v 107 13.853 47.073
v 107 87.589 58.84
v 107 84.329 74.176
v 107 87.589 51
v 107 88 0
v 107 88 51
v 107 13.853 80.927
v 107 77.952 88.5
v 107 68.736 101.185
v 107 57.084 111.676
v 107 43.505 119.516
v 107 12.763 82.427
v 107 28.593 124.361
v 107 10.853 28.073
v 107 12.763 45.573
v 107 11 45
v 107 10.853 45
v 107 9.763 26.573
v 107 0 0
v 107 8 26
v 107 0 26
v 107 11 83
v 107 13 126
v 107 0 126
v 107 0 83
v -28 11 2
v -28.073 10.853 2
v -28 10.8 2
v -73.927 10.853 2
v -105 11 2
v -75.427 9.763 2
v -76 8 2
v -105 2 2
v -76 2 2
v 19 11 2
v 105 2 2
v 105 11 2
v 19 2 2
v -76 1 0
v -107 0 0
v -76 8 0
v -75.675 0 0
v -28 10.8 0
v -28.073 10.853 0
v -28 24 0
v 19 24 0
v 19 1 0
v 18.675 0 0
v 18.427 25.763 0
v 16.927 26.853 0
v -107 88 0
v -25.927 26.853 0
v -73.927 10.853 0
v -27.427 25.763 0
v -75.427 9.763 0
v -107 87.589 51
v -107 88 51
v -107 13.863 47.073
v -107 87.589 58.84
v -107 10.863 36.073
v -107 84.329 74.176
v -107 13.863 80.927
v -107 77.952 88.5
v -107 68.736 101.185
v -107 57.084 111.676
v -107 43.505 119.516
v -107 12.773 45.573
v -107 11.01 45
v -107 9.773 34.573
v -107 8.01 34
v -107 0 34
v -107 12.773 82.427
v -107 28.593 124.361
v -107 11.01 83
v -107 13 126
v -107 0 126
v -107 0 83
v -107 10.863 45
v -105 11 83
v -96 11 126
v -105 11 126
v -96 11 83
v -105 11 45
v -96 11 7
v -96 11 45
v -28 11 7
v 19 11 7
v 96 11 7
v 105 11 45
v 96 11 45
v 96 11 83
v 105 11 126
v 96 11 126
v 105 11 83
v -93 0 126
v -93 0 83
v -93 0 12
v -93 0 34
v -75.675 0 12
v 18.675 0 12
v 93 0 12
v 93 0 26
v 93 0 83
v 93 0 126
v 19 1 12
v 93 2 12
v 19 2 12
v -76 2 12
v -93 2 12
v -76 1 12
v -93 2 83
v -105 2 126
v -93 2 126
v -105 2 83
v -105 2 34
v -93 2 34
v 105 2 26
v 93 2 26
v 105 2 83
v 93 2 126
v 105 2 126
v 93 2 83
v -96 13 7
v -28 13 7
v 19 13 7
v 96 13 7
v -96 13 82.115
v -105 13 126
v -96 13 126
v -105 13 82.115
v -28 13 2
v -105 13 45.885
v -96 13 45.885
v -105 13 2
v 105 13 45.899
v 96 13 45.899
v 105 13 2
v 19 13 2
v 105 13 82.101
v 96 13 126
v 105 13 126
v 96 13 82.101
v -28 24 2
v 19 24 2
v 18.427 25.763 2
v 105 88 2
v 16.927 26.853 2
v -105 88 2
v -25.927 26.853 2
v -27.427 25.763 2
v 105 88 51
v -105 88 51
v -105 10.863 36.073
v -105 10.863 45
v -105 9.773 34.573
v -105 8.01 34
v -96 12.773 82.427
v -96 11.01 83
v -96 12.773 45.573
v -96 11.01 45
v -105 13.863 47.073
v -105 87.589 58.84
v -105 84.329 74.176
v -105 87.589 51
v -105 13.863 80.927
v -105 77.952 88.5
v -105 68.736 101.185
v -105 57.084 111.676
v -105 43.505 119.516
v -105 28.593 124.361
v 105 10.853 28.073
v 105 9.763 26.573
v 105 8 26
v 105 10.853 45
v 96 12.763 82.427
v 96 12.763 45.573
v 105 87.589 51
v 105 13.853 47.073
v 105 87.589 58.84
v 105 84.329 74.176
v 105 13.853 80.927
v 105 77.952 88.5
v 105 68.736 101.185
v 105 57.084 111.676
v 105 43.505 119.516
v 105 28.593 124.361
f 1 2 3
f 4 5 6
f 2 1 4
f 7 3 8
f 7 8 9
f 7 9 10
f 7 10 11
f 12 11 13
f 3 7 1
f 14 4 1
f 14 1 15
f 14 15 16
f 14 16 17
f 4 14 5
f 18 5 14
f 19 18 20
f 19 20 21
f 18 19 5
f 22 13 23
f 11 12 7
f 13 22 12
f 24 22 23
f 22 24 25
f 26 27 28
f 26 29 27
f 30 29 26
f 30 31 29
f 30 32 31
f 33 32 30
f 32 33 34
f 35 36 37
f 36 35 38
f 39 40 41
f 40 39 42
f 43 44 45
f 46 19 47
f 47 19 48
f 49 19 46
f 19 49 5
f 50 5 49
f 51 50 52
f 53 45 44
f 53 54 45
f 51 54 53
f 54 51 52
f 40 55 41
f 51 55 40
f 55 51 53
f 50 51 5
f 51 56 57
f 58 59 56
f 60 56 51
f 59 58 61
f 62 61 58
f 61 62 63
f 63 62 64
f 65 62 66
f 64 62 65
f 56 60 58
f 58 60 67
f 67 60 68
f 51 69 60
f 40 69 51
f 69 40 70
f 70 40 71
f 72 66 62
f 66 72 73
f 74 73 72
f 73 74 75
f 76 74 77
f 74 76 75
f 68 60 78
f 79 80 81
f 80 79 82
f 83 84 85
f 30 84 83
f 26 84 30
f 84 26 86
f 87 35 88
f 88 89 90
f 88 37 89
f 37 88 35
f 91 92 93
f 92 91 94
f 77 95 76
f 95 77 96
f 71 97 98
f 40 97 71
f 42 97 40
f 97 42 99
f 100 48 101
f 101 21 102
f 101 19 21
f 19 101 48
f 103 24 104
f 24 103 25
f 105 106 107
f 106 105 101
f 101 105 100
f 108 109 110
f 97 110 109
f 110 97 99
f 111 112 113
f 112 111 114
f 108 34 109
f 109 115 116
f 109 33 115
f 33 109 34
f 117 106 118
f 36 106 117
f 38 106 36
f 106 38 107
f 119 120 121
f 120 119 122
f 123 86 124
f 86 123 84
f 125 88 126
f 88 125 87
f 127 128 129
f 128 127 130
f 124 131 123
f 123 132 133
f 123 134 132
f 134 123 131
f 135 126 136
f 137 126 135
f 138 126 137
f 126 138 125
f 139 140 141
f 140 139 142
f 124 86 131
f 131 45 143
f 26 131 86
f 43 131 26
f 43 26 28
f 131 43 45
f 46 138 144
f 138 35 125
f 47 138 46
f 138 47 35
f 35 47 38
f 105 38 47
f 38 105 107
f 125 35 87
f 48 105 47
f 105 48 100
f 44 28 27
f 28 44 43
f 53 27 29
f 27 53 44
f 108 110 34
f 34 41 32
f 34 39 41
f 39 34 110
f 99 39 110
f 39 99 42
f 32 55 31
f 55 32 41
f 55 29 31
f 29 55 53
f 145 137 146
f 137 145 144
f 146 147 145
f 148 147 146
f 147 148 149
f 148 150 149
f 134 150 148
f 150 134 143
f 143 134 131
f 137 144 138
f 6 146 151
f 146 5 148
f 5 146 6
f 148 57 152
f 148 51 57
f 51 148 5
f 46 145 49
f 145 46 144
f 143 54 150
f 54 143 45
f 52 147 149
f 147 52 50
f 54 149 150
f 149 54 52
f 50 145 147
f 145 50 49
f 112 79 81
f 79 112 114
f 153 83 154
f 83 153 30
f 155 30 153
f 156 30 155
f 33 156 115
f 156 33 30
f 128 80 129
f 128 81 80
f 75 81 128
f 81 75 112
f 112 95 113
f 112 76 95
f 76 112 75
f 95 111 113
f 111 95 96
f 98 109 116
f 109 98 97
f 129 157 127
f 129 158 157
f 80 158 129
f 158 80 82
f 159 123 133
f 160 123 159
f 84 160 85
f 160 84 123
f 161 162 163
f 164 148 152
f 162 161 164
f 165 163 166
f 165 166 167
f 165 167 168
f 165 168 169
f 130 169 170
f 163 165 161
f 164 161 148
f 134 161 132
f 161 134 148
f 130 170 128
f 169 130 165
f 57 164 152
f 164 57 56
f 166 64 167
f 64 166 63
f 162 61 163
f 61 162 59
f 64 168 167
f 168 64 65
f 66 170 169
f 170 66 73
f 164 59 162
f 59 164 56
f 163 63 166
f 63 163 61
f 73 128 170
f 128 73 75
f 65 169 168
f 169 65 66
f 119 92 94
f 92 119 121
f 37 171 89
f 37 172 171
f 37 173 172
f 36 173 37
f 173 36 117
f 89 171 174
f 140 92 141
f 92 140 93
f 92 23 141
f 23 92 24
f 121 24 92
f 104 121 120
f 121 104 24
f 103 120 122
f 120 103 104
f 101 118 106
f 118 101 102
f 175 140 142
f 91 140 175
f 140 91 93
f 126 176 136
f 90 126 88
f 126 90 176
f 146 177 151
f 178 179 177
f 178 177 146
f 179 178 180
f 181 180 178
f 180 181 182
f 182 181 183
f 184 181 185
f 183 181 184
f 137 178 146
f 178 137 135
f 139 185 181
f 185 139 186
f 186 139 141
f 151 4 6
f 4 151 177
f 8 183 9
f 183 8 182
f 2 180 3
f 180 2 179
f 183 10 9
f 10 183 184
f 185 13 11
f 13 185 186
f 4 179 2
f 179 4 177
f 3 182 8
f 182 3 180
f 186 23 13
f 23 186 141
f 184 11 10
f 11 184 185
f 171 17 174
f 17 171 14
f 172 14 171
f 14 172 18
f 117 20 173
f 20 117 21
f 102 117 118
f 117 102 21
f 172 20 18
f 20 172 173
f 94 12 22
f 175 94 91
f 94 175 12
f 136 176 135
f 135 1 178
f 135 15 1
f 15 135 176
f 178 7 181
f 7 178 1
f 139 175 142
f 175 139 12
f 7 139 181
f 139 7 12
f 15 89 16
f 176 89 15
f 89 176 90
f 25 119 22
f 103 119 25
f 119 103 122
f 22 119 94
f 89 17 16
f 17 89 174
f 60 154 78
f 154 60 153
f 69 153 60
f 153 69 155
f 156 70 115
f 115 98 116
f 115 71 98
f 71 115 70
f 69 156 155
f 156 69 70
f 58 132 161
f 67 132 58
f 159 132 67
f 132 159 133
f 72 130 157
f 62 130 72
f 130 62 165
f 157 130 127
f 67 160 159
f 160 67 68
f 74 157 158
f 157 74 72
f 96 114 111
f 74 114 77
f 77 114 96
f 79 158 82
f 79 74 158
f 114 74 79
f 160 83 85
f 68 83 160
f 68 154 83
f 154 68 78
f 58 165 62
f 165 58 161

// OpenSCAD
//$fn = 350; //rendering- number of detail
// preview[view:north east, tilt:top diagonal]
/* [Data_of_Your_device] */
//Variables for thingiverse customizer
//(tablet, smartphone, GPS navigation device)
lenght_of_your_device = 210; // [1:300]
thickness_of_your_device = 9;// [1:0.1:30]
width_of_your_device = 124; // [1:300]
/* [Data for sun shield] */
thickness_of_shield = 2; // [0.5:0.1:4]
//Values greater than width of device will not affect model 
lenght_of_shield = 75;//[1:300]
//(exactly the walls of grip)
thickness_of_grip = 2; // [0.5:0.1:4]
height_of_front_part_of_the_grip = 5;// [1:40]
height_of_front_left_and_right_side_of_the_grip = 9;//[1:40]
height_of_back_part_of_the_grip = 12;//[1:50]
/* [First top hole] */
// If You don't want this hole - type 0
lenght_of_first_top_hole = 47; //[0:300]
width_of_first_top_hole = 25; // [0:300]  
position_of_first_top_hole = 77; // [0:300]
/* [Second top hole] */
// If You don't want this hole - type 0
lenght_of_second_top_hole = 50; //[0:300]
width_of_second_top_hole = 9; // [0:300]
position_of_second_top_hole = 29; //[0:300]
/* [First right hole] */
// If You don't want this hole - type 0
lenght_of_first_right_hole = 25; // [0:300]
width_of_first_right_hole = 9; // [0:300]
position_of_first_right_hole = 24; // [0:300]
/* [Second right hole] */
// If You don't want this hole - type 0
lenght_of_second_right_hole = 40; //[0:300]
width_of_second_right_hole = 12; //[0:300]
position_of_second_right_hole = 43; //[0:300]
/* [First left hole] */
// If You don't want this hole - type 0
lenght_of_first_left_hole = 25; //[0:300]
width_of_first_left_hole = 9; //[0:300]
position_of_left_right_hole = 32; // [0:300]
/* [Second left hole] */
// If You don't want this hole - type 0
lenght_of_second_left_hole = 40; //[0:300]
width_of_second_left_hole = 12; //[0:300]
position_of_second_left_hole = 43; // [0:300]


// ignore variable values 
l_dev = lenght_of_your_device;
t_dev = thickness_of_your_device;
w_dev = width_of_your_device; 
t_sh = thickness_of_shield; 

l_sh = lenght_of_shield>w_dev ? w_dev : lenght_of_shield; //blockade of length of shield
t_grip = thickness_of_grip; 
hf_grip = height_of_front_part_of_the_grip; 
hfs_grip = height_of_front_left_and_right_side_of_the_grip; 
hb_grip = height_of_back_part_of_the_grip;

d_hole1= hb_grip>hf_grip ? hb_grip : hf_grip;
d_hole2= hfs_grip>hb_grip ? hfs_grip : hb_grip;//deep of the holes   

lh1_top = lenght_of_first_top_hole; 
wh1_top = width_of_first_top_hole; 
lh2_top = lenght_of_second_top_hole; 
wh2_top = width_of_second_top_hole;

//solution for minus position of holes
a = l_dev/2; //helper
pos_h1_top = position_of_first_top_hole - a;

pos_h2_top = position_of_second_top_hole - a; 


 
lh1_right = lenght_of_first_right_hole; 
wh1_right = width_of_first_right_hole; 
//solution for position of holes
pos_h1_right = position_of_first_right_hole + lenght_of_first_right_hole; 
lh2_right = lenght_of_second_right_hole; 
wh2_right = width_of_second_right_hole; 
pos_h2_right = position_of_second_right_hole + lenght_of_second_right_hole; 

lh1_left = lenght_of_first_left_hole; 
wh1_left = width_of_first_left_hole; 
pos_h1_left = position_of_left_right_hole + lenght_of_first_left_hole; 
lh2_left = lenght_of_second_left_hole; 
wh2_left = width_of_second_left_hole; 
pos_h2_left = position_of_second_left_hole + lenght_of_second_left_hole;

module top(){
    //bottom grip plate
    translate([-l_dev/2 - t_sh,0,0]){
        cube([l_dev + 2*t_sh, t_dev + t_grip, t_sh]);   
    } 
    //back grip plate
    translate([-l_dev/2 - t_sh,0,0]){ 
        cube([l_dev + 2*t_sh, t_grip, hb_grip]);   
    } 
    //front grip plate
    translate([-l_dev/2 - t_sh,t_dev + t_grip,0]){
        cube([l_dev +2*t_sh, t_grip, hf_grip+t_sh]);   
    } 
}

module top_plate(){
    translate([-l_dev/2 - t_sh,t_dev + 2 * t_grip,0]){
        cube([l_dev +2*t_sh, l_sh, t_sh]);   
    }      
}

module left_side_grip(){
    //side grip plate
    translate([-l_dev/2 - t_sh,0,0]){
        cube([t_sh, t_dev + t_grip, w_dev + t_sh]);   
    } 
    //back grip plate
    translate([-l_dev/2 - t_sh,0,0]){
        cube([hb_grip + t_sh, t_grip, w_dev + t_sh]);   
    } 
    //front grip plate
    translate([-l_dev/2 - t_sh,t_dev + t_grip,0]){
        cube([hfs_grip+t_sh, t_grip, w_dev + t_sh]);   
    }      
}

module left_side_plate(){
    translate([-l_dev/2 - t_sh,t_dev + 2 * t_grip,0]){
        cube([t_sh, l_sh, w_dev - l_sh + t_sh]);   
    }
    //curved part of the side plate
  // color([0.1,1.0,0.2]){
        intersection(){  
            translate([-l_dev/2- t_sh,t_dev + 2 * t_grip,w_dev - l_sh + t_sh]){
                cube([t_sh, l_sh, l_sh]);   
            }
            translate([-l_dev/2- t_sh,t_dev + 2 * t_grip,w_dev - l_sh + t_sh]){
                rotate([0,90,0]){
                    cylinder(h = t_sh,r = l_sh);
                }   
            }

        } 
                  
  //  }
}
//mirror of the side plate
module right_side_all(){
    mirror([1,0,0]){
        left_side_grip();
        left_side_plate();
    }  

}

module top_hole(){
       
  //  color([0.1,0.8,0.2]){
        translate([pos_h1_top+3, 1, -1]){   
            minkowski() 
            {
              cube([lh1_top-6,wh1_top-4 + t_sh, d_hole1]); //6 because of cylinder r*2
              cylinder(r=3,h=d_hole1);
            }
        }
                  
 //  }
}

module top_hole_2(){
       
  //  color([0.1,0.8,0.2]){
        translate([pos_h2_top+3,1,-1]){   
            minkowski() 
            {
              cube([lh2_top - 6, wh2_top - 4 + t_sh, d_hole1]);
              cylinder(r=3,h=d_hole1);
            }
        }
                  
  // }
}

module right_hole(){
  // color([0.1,0.8,0.2]){
        translate([l_dev/2-d_hole2-0.01,0,pos_h1_right-3]){  //0.01 value is used beause of rendering problem (shadows)
            rotate([0,90,0]){
                minkowski()
                {
                  cube([lh1_right - 6 - t_sh, wh1_right-3 + t_sh,d_hole2]);
                  cylinder(r=3,h=d_hole2);
                }
            }
        }
                  
  // }       

}

module right_hole_2(){
  //  color([0.1,0.8,0.2]){
        translate([l_dev/2-d_hole2-0.01,0,pos_h2_right-3]){//0.01 value is used beause of rendering problem (shadows) 
            rotate([0,90,0]){
                minkowski()
                {
                  cube([lh2_right - 6 - t_sh,wh2_right-3 + t_sh, d_hole2]);
                  cylinder(r=3,h=d_hole2);
                }
            }
       }
                  
 //  }       

}

module left_hole(){
       
 //   color([0.1,0.8,0.2]){
        translate([-l_dev/2 - 0.01- t_sh, 0, pos_h1_left-3]){ //0.01 value is used beause of rendering problem (shadows)  
            rotate([0,90,0]){
                minkowski() 
                {
                  cube([lh1_left - 6 - t_sh,wh1_left-3 + t_sh+0.01, d_hole2]);//0.01 value is used beause of rendering problem (shadows)
                  cylinder(r=3,h=d_hole2);
                }
            }
        }
                  
 //  }
}

module left_hole_2(){
       
 //   color([0.1,0.8,0.2]){
        translate([-l_dev/2 - 0.01- t_sh, 0, pos_h2_left-3]){ //0.01 value is used beause of rendering problem (shadows)  
            rotate([0,90,0]){
                minkowski()
                {
                  cube([lh2_left - 6 - t_sh,wh2_left-3 + t_sh+0.01,d_hole2]); //0.01 value is used beause of rendering problem (shadows)
                  cylinder(r=3,h=d_hole2);
                }
            }
        }
                  
  // }
}

module difference_top(){
    difference(){
        difference(){
            
          top();
          top_hole();
          
        }  
        top_hole_2();
    } 
    difference(){
        difference(){
            
          top_plate();
          top_hole();
          
        } 
        top_hole_2();
    }
    

}

module difference_left(){
    difference(){
      difference(){
          
          left_side_grip();
          left_hole();
          
      }    
      left_hole_2();
    }  
    difference(){
      difference(){ 
          
          left_side_plate();
          left_hole();
          
      }
      left_hole_2();
    }    

}


module difference_right(){
    difference(){
       difference(){
           
      right_side_all();
      right_hole();
           
       }
     right_hole_2(); 
    }    

}

difference_top();
difference_right();
difference_left();
